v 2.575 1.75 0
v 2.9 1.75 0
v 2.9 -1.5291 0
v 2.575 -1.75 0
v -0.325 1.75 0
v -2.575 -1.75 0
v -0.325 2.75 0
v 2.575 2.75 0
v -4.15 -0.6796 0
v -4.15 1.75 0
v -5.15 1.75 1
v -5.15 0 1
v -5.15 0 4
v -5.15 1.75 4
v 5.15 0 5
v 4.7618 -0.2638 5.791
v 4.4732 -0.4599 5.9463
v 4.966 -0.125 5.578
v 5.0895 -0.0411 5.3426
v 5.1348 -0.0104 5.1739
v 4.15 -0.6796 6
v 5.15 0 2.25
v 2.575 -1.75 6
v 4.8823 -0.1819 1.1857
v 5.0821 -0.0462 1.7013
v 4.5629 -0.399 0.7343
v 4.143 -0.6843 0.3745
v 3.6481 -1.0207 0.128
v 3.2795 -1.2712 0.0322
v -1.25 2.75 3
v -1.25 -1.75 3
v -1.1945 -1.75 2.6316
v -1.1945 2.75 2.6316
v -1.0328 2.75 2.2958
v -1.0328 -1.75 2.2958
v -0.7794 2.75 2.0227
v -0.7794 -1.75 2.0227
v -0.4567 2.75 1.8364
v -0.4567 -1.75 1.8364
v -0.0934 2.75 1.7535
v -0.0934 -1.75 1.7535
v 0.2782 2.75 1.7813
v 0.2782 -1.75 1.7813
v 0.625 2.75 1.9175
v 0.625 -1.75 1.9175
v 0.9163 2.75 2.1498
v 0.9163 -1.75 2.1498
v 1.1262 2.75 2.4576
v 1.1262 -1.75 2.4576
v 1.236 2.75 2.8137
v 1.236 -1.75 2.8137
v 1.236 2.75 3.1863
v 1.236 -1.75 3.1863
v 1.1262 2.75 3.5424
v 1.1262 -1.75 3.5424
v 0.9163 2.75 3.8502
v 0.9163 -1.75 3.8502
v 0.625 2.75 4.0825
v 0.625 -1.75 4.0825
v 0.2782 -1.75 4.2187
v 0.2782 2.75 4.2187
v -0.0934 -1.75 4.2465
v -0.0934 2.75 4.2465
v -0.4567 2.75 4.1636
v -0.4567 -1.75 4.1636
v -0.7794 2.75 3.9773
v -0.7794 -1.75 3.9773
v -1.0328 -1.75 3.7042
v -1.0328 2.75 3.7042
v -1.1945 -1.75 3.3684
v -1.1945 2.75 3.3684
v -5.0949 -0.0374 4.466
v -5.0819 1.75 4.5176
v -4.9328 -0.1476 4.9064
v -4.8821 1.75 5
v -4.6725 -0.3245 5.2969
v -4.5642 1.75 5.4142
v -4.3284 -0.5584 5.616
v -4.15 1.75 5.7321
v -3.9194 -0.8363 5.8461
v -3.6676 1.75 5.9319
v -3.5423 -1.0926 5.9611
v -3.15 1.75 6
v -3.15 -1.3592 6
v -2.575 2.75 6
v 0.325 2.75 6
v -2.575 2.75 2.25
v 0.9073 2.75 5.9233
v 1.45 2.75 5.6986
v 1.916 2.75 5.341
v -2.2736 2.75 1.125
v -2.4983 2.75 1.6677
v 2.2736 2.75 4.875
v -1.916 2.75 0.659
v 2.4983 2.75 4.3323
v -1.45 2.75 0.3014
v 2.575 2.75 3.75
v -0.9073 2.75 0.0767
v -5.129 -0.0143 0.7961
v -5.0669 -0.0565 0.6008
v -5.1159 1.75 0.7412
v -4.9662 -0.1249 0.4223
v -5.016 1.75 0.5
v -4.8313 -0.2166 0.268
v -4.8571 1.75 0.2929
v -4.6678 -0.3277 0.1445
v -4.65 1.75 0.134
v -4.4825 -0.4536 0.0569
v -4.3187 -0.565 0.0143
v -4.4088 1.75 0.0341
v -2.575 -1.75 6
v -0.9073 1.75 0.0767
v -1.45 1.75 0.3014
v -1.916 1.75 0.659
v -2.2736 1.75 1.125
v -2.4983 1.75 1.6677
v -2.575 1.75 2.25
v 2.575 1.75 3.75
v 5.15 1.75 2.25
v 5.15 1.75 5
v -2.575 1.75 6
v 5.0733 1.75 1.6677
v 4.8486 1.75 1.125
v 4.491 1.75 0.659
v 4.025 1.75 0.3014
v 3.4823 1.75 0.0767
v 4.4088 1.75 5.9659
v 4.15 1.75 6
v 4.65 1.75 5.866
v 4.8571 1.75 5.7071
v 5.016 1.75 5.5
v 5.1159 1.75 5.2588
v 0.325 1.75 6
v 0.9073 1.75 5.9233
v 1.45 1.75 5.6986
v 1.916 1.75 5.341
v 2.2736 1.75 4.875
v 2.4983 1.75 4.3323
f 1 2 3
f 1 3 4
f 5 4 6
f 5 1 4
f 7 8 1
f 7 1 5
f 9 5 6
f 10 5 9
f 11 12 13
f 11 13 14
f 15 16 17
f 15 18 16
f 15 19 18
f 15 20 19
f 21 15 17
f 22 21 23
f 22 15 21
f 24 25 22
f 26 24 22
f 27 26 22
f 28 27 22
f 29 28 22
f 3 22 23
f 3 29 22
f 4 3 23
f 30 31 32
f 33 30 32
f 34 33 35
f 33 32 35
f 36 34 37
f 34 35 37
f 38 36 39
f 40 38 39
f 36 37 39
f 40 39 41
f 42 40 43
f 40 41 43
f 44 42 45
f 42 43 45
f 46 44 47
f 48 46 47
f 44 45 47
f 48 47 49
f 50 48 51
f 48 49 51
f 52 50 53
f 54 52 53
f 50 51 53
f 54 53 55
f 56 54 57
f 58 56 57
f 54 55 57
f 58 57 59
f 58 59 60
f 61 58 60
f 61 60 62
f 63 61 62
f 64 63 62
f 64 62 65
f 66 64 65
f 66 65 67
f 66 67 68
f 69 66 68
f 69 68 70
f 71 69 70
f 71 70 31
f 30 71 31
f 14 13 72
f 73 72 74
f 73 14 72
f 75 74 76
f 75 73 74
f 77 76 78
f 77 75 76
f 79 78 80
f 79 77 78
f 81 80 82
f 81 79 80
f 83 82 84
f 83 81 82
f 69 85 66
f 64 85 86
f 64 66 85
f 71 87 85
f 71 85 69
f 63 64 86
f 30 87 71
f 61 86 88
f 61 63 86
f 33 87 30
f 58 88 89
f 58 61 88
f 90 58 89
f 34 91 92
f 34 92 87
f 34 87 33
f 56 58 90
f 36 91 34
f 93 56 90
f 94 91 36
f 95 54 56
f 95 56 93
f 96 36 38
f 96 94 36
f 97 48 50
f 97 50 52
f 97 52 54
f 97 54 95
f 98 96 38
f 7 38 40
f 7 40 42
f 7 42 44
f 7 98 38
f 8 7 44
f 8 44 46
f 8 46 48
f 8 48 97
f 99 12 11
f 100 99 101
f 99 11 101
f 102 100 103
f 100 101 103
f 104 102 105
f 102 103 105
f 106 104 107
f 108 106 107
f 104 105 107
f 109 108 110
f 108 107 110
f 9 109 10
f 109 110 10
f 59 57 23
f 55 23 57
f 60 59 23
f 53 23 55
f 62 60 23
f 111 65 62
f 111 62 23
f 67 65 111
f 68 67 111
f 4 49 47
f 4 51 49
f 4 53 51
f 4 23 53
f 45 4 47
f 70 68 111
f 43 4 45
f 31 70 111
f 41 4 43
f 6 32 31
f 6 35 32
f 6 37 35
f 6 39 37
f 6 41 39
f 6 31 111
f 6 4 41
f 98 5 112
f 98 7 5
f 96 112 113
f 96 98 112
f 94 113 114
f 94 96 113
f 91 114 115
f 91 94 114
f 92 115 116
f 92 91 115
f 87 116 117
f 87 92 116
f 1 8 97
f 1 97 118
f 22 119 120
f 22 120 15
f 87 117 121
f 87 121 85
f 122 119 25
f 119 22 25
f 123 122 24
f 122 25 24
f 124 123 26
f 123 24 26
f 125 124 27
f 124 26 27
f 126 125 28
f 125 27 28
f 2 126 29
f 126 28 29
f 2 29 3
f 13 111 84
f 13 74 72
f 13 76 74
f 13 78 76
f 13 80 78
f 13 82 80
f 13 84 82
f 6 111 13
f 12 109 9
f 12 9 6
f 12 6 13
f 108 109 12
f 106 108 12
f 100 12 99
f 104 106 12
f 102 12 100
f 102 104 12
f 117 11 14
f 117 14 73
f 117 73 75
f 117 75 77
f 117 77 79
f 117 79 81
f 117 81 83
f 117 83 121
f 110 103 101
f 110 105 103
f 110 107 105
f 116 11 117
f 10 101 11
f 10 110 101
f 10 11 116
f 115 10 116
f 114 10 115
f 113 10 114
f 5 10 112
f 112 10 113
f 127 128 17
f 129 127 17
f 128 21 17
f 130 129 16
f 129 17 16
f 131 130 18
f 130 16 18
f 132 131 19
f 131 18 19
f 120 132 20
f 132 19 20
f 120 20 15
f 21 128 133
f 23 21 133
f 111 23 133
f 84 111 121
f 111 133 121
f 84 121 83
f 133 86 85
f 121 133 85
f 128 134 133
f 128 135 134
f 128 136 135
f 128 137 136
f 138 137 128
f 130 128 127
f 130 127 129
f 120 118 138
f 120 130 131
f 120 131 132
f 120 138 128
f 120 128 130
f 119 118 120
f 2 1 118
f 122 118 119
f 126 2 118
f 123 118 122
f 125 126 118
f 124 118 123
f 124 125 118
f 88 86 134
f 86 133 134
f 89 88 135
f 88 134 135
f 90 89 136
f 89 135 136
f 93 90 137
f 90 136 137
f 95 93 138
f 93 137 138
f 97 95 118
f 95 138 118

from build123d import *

# Parameters (mm, degrees)
BOSS_EXTRUDE1_DEPTH   = 6
M3X0_5_TAPPED_HOLE1_D = 2.5
FILLET1_R             = 1
FILLET2_R             = 2
FILLET3_R             = 1
FILLET4_R             = 2.25
FILLET5_R             = 2.25


with BuildPart() as part:
    # Sketch1 → Boss-Extrude1 (new body)
    with BuildSketch(Plane.XY):
        Polygon((-5.15, 1.75), (-2.575, 1.75), (-2.575, 2.75), (2.575, 2.75), (2.575, 1.75), (5.15, 1.75), (5.15, 0), (2.575, -1.75), (-2.575, -1.75), (-5.15, 0), align=None)
    extrude(amount=BOSS_EXTRUDE1_DEPTH)

    # M3x0.5 Tapped Hole1 (through all)
    with Locations(Plane(origin=(0, 2.75, 0), x_dir=(1, 0, 0), z_dir=(0, 1, 0))):
        with Locations((0, -3)):
            Hole(M3X0_5_TAPPED_HOLE1_D / 2)

    # Fillet1
    fillet1_edges = [part.edges().sort_by_distance(p)[0] for p in [
        (-5.15, 0.875, 0),
    ]]
    fillet(fillet1_edges, radius=FILLET1_R)

    # Fillet2
    fillet2_edges = [part.edges().sort_by_distance(p)[0] for p in [
        (-5.15, 0.875, 6),
    ]]
    fillet(fillet2_edges, radius=FILLET2_R)

    # Fillet3
    fillet3_edges = [part.edges().sort_by_distance(p)[0] for p in [
        (5.15, 0.875, 6),
    ]]
    fillet(fillet3_edges, radius=FILLET3_R)

    # Fillet4
    fillet4_edges = [part.edges().sort_by_distance(p)[0] for p in [
        (5.15, 0.875, 0),
    ]]
    fillet(fillet4_edges, radius=FILLET4_R)

    # Fillet5
    fillet5_edges = [part.edges().sort_by_distance(p)[0] for p in [
        (-2.575, 2.25, 0),
        (2.575, 2.25, 6),
    ]]
    fillet(fillet5_edges, radius=FILLET5_R)


solid = part.part
